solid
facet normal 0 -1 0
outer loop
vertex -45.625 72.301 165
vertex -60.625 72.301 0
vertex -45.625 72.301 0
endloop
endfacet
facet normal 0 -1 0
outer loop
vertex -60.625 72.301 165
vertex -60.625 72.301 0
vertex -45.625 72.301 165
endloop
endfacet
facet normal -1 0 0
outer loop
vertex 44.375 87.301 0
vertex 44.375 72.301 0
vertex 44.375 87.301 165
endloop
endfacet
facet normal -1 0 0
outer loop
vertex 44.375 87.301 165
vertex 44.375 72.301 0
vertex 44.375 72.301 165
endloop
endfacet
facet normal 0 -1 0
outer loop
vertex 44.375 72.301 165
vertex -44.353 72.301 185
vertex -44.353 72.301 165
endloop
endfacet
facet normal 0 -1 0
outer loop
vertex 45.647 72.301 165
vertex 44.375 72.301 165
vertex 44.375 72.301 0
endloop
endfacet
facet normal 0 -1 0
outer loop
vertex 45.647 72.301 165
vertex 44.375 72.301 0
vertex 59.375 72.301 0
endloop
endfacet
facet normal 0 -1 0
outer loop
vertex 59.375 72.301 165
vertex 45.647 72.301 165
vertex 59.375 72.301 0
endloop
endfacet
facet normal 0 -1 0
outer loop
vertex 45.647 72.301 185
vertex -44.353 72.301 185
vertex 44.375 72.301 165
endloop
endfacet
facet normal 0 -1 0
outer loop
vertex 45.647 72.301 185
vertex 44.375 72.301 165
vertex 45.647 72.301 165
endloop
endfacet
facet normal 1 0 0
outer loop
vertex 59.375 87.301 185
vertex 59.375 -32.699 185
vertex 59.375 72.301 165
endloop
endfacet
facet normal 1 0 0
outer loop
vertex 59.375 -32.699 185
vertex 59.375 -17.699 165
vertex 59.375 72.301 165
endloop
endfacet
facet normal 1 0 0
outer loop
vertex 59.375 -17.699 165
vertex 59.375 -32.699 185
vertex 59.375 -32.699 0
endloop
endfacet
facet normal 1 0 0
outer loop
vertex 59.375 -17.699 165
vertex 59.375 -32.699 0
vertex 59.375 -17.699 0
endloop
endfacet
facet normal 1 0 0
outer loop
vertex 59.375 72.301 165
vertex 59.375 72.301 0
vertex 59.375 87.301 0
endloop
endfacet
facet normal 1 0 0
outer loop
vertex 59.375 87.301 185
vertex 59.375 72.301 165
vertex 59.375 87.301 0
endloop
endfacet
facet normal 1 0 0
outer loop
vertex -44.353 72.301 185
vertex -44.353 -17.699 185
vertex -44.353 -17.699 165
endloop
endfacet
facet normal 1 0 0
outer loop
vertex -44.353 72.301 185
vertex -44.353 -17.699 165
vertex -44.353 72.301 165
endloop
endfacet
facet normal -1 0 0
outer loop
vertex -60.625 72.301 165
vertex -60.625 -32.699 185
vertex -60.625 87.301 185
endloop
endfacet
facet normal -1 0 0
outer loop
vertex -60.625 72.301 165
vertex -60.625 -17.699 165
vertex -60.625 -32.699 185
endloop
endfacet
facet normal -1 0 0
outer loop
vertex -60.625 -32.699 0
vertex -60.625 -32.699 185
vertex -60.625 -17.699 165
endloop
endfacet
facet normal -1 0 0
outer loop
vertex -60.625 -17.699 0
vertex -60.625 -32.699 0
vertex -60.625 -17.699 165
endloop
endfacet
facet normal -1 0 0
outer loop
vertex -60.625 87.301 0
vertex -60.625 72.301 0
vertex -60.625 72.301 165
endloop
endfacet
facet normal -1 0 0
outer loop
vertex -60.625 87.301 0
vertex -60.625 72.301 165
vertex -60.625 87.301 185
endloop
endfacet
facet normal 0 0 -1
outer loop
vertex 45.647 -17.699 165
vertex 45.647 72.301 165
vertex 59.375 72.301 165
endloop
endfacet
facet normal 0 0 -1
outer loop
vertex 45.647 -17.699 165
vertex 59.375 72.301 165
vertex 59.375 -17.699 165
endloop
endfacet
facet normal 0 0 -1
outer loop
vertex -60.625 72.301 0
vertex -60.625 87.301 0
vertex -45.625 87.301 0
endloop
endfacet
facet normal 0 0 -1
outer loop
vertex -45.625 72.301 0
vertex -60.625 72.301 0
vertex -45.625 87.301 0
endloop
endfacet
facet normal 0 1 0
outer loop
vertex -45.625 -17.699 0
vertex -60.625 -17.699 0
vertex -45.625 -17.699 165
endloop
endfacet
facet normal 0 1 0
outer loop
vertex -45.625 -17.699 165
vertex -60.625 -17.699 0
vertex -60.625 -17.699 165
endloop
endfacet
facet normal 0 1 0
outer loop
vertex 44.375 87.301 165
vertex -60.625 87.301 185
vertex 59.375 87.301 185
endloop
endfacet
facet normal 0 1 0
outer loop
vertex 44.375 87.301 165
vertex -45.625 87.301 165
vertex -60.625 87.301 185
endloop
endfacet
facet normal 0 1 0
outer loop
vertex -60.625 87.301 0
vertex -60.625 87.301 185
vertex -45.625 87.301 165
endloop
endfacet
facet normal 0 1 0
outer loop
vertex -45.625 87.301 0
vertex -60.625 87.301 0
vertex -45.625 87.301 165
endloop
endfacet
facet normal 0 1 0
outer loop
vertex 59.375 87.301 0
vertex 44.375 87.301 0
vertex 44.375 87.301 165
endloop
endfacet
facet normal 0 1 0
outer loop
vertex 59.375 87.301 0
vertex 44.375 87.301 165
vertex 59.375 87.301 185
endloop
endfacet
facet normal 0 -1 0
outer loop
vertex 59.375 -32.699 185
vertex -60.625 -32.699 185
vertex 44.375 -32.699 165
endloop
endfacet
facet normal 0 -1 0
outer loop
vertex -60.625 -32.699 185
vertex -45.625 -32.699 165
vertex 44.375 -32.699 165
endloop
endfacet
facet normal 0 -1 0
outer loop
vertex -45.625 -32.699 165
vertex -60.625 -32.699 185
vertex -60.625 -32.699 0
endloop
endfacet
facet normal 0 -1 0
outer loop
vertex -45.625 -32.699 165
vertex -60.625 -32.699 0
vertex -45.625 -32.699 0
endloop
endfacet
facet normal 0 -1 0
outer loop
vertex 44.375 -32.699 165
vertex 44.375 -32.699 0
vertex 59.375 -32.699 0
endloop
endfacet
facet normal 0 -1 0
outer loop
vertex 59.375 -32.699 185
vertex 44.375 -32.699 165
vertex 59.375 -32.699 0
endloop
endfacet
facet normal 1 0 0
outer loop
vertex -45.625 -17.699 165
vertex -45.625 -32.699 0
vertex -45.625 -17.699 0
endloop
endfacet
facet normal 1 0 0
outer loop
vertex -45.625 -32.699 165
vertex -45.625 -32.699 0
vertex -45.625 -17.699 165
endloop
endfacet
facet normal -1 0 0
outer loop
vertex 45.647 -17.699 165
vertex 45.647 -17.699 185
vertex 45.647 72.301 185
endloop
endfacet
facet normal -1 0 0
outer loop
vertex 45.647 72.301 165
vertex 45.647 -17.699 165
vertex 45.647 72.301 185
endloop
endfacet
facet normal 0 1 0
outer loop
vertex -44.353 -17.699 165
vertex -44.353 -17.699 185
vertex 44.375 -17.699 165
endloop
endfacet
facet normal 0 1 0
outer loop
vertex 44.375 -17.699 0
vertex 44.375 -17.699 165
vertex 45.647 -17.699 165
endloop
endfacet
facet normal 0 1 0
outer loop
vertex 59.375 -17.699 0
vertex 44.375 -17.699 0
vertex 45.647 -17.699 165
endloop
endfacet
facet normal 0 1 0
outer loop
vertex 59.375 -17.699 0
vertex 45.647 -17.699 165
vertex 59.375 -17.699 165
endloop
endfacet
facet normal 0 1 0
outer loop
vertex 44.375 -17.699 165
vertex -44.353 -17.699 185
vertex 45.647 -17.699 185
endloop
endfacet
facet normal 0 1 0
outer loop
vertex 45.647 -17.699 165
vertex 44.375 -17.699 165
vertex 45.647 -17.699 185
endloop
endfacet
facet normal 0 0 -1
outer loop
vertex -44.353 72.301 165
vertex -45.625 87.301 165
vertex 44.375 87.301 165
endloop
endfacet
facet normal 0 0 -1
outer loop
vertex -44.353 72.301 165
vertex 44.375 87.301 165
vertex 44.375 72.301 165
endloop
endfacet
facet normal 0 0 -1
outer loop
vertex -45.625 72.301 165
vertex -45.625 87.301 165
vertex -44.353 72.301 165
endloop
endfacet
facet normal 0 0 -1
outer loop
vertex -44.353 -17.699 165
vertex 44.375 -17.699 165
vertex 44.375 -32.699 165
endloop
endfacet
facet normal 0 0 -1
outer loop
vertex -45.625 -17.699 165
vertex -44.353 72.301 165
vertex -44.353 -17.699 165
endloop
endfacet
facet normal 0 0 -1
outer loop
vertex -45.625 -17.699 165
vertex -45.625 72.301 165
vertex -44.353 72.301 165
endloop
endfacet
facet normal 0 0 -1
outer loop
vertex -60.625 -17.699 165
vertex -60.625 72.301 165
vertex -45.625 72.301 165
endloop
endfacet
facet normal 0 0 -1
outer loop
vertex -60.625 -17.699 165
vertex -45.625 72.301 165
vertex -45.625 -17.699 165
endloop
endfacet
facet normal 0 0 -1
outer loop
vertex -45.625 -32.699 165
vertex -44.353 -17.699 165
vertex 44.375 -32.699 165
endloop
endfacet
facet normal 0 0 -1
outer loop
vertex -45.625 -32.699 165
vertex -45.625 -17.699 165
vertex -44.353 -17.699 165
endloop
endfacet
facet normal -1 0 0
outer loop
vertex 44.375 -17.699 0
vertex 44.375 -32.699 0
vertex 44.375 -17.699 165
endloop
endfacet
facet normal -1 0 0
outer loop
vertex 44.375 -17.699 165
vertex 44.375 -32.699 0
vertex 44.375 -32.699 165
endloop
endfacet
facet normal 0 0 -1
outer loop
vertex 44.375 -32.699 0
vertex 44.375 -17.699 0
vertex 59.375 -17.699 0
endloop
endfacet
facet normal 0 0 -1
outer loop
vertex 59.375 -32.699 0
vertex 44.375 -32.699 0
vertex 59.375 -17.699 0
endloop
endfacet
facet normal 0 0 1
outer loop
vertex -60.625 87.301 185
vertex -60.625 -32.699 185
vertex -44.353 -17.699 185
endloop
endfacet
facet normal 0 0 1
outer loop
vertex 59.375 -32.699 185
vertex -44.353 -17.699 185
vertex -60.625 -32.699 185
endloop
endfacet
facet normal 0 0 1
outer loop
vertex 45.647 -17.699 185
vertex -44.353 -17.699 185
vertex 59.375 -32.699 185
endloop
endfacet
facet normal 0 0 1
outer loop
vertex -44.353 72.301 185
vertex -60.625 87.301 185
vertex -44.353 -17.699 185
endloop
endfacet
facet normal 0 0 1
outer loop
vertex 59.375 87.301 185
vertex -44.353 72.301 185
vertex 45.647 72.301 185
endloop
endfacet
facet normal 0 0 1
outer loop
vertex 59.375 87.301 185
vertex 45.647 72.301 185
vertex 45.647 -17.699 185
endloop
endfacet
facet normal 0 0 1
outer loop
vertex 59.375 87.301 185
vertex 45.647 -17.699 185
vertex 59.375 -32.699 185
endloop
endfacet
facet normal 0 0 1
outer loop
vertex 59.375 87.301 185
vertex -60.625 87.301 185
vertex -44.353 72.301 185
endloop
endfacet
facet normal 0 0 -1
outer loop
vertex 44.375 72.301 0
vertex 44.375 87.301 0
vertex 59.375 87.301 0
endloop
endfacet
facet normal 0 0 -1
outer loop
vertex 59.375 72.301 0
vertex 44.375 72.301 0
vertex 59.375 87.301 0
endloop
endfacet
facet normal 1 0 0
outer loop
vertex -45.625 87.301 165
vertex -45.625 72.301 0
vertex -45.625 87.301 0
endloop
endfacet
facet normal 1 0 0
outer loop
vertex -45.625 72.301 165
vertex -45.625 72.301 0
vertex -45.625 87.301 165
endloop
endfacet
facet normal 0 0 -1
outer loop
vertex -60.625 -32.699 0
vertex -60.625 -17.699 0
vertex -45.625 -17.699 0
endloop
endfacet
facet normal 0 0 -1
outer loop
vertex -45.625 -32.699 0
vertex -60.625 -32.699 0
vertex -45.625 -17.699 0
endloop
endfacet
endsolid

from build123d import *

# Parameters (mm, degrees)
F0_W      = 120
F0_H      = 120
F1_DEPTH  = 5
F2_R      = 12.5
F3_DEPTH  = 25
F4_W      = 120
F4_H      = 120
F5_DEPTH  = 180
F6_W      = 90
F6_H      = 165
F7_DEPTH  = 120
F8_W      = 90
F8_H      = 165
F9_DEPTH  = 120
F10_W     = 90
F10_H     = 90
F11_DEPTH = 25


with BuildPart() as f1:
    # F0 (on Top) → F1 (new body)
    with BuildSketch(Plane.XY):
        with Locations((-0.624557, 27.300639)):
            Rectangle(F0_W, F0_H)
    extrude(amount=F1_DEPTH)

    # F2 (on face) → F3 (cut)
    with BuildSketch(Plane.XY.offset(5)):
        with Locations((-0.624557, 27.300639)):
            Circle(F2_R)
    extrude(amount=-F3_DEPTH, mode=Mode.SUBTRACT)

    # F4 (on face) → F5 (join)
    with BuildSketch(Plane.XY.offset(5)):
        with Locations((-0.624557, 27.300639)):
            Rectangle(F4_W, F4_H)
    extrude(amount=F5_DEPTH)

    # F6 (on face) → F7 (cut)
    with BuildSketch(Plane.XZ.offset(32.699361)):
        with Locations((-0.624557, 82.5)):
            Rectangle(F6_W, F6_H)
    extrude(amount=-F7_DEPTH, mode=Mode.SUBTRACT)

    # F8 (on face) → F9 (cut)
    with BuildSketch(Plane(origin=(-60.624557, 0, 0), x_dir=(0, -1, 0), z_dir=(-1, 0, 0))):
        with Locations((-27.300639, 82.5)):
            Rectangle(F8_W, F8_H)
    extrude(amount=-F9_DEPTH, mode=Mode.SUBTRACT)

    # F10 (on face) → F11 (cut)
    with BuildSketch(Plane.XY.offset(185)):
        with Locations((0.647055, 27.300639)):
            Rectangle(F10_W, F10_H)
    extrude(amount=-F11_DEPTH, mode=Mode.SUBTRACT)


solid = f1.part
